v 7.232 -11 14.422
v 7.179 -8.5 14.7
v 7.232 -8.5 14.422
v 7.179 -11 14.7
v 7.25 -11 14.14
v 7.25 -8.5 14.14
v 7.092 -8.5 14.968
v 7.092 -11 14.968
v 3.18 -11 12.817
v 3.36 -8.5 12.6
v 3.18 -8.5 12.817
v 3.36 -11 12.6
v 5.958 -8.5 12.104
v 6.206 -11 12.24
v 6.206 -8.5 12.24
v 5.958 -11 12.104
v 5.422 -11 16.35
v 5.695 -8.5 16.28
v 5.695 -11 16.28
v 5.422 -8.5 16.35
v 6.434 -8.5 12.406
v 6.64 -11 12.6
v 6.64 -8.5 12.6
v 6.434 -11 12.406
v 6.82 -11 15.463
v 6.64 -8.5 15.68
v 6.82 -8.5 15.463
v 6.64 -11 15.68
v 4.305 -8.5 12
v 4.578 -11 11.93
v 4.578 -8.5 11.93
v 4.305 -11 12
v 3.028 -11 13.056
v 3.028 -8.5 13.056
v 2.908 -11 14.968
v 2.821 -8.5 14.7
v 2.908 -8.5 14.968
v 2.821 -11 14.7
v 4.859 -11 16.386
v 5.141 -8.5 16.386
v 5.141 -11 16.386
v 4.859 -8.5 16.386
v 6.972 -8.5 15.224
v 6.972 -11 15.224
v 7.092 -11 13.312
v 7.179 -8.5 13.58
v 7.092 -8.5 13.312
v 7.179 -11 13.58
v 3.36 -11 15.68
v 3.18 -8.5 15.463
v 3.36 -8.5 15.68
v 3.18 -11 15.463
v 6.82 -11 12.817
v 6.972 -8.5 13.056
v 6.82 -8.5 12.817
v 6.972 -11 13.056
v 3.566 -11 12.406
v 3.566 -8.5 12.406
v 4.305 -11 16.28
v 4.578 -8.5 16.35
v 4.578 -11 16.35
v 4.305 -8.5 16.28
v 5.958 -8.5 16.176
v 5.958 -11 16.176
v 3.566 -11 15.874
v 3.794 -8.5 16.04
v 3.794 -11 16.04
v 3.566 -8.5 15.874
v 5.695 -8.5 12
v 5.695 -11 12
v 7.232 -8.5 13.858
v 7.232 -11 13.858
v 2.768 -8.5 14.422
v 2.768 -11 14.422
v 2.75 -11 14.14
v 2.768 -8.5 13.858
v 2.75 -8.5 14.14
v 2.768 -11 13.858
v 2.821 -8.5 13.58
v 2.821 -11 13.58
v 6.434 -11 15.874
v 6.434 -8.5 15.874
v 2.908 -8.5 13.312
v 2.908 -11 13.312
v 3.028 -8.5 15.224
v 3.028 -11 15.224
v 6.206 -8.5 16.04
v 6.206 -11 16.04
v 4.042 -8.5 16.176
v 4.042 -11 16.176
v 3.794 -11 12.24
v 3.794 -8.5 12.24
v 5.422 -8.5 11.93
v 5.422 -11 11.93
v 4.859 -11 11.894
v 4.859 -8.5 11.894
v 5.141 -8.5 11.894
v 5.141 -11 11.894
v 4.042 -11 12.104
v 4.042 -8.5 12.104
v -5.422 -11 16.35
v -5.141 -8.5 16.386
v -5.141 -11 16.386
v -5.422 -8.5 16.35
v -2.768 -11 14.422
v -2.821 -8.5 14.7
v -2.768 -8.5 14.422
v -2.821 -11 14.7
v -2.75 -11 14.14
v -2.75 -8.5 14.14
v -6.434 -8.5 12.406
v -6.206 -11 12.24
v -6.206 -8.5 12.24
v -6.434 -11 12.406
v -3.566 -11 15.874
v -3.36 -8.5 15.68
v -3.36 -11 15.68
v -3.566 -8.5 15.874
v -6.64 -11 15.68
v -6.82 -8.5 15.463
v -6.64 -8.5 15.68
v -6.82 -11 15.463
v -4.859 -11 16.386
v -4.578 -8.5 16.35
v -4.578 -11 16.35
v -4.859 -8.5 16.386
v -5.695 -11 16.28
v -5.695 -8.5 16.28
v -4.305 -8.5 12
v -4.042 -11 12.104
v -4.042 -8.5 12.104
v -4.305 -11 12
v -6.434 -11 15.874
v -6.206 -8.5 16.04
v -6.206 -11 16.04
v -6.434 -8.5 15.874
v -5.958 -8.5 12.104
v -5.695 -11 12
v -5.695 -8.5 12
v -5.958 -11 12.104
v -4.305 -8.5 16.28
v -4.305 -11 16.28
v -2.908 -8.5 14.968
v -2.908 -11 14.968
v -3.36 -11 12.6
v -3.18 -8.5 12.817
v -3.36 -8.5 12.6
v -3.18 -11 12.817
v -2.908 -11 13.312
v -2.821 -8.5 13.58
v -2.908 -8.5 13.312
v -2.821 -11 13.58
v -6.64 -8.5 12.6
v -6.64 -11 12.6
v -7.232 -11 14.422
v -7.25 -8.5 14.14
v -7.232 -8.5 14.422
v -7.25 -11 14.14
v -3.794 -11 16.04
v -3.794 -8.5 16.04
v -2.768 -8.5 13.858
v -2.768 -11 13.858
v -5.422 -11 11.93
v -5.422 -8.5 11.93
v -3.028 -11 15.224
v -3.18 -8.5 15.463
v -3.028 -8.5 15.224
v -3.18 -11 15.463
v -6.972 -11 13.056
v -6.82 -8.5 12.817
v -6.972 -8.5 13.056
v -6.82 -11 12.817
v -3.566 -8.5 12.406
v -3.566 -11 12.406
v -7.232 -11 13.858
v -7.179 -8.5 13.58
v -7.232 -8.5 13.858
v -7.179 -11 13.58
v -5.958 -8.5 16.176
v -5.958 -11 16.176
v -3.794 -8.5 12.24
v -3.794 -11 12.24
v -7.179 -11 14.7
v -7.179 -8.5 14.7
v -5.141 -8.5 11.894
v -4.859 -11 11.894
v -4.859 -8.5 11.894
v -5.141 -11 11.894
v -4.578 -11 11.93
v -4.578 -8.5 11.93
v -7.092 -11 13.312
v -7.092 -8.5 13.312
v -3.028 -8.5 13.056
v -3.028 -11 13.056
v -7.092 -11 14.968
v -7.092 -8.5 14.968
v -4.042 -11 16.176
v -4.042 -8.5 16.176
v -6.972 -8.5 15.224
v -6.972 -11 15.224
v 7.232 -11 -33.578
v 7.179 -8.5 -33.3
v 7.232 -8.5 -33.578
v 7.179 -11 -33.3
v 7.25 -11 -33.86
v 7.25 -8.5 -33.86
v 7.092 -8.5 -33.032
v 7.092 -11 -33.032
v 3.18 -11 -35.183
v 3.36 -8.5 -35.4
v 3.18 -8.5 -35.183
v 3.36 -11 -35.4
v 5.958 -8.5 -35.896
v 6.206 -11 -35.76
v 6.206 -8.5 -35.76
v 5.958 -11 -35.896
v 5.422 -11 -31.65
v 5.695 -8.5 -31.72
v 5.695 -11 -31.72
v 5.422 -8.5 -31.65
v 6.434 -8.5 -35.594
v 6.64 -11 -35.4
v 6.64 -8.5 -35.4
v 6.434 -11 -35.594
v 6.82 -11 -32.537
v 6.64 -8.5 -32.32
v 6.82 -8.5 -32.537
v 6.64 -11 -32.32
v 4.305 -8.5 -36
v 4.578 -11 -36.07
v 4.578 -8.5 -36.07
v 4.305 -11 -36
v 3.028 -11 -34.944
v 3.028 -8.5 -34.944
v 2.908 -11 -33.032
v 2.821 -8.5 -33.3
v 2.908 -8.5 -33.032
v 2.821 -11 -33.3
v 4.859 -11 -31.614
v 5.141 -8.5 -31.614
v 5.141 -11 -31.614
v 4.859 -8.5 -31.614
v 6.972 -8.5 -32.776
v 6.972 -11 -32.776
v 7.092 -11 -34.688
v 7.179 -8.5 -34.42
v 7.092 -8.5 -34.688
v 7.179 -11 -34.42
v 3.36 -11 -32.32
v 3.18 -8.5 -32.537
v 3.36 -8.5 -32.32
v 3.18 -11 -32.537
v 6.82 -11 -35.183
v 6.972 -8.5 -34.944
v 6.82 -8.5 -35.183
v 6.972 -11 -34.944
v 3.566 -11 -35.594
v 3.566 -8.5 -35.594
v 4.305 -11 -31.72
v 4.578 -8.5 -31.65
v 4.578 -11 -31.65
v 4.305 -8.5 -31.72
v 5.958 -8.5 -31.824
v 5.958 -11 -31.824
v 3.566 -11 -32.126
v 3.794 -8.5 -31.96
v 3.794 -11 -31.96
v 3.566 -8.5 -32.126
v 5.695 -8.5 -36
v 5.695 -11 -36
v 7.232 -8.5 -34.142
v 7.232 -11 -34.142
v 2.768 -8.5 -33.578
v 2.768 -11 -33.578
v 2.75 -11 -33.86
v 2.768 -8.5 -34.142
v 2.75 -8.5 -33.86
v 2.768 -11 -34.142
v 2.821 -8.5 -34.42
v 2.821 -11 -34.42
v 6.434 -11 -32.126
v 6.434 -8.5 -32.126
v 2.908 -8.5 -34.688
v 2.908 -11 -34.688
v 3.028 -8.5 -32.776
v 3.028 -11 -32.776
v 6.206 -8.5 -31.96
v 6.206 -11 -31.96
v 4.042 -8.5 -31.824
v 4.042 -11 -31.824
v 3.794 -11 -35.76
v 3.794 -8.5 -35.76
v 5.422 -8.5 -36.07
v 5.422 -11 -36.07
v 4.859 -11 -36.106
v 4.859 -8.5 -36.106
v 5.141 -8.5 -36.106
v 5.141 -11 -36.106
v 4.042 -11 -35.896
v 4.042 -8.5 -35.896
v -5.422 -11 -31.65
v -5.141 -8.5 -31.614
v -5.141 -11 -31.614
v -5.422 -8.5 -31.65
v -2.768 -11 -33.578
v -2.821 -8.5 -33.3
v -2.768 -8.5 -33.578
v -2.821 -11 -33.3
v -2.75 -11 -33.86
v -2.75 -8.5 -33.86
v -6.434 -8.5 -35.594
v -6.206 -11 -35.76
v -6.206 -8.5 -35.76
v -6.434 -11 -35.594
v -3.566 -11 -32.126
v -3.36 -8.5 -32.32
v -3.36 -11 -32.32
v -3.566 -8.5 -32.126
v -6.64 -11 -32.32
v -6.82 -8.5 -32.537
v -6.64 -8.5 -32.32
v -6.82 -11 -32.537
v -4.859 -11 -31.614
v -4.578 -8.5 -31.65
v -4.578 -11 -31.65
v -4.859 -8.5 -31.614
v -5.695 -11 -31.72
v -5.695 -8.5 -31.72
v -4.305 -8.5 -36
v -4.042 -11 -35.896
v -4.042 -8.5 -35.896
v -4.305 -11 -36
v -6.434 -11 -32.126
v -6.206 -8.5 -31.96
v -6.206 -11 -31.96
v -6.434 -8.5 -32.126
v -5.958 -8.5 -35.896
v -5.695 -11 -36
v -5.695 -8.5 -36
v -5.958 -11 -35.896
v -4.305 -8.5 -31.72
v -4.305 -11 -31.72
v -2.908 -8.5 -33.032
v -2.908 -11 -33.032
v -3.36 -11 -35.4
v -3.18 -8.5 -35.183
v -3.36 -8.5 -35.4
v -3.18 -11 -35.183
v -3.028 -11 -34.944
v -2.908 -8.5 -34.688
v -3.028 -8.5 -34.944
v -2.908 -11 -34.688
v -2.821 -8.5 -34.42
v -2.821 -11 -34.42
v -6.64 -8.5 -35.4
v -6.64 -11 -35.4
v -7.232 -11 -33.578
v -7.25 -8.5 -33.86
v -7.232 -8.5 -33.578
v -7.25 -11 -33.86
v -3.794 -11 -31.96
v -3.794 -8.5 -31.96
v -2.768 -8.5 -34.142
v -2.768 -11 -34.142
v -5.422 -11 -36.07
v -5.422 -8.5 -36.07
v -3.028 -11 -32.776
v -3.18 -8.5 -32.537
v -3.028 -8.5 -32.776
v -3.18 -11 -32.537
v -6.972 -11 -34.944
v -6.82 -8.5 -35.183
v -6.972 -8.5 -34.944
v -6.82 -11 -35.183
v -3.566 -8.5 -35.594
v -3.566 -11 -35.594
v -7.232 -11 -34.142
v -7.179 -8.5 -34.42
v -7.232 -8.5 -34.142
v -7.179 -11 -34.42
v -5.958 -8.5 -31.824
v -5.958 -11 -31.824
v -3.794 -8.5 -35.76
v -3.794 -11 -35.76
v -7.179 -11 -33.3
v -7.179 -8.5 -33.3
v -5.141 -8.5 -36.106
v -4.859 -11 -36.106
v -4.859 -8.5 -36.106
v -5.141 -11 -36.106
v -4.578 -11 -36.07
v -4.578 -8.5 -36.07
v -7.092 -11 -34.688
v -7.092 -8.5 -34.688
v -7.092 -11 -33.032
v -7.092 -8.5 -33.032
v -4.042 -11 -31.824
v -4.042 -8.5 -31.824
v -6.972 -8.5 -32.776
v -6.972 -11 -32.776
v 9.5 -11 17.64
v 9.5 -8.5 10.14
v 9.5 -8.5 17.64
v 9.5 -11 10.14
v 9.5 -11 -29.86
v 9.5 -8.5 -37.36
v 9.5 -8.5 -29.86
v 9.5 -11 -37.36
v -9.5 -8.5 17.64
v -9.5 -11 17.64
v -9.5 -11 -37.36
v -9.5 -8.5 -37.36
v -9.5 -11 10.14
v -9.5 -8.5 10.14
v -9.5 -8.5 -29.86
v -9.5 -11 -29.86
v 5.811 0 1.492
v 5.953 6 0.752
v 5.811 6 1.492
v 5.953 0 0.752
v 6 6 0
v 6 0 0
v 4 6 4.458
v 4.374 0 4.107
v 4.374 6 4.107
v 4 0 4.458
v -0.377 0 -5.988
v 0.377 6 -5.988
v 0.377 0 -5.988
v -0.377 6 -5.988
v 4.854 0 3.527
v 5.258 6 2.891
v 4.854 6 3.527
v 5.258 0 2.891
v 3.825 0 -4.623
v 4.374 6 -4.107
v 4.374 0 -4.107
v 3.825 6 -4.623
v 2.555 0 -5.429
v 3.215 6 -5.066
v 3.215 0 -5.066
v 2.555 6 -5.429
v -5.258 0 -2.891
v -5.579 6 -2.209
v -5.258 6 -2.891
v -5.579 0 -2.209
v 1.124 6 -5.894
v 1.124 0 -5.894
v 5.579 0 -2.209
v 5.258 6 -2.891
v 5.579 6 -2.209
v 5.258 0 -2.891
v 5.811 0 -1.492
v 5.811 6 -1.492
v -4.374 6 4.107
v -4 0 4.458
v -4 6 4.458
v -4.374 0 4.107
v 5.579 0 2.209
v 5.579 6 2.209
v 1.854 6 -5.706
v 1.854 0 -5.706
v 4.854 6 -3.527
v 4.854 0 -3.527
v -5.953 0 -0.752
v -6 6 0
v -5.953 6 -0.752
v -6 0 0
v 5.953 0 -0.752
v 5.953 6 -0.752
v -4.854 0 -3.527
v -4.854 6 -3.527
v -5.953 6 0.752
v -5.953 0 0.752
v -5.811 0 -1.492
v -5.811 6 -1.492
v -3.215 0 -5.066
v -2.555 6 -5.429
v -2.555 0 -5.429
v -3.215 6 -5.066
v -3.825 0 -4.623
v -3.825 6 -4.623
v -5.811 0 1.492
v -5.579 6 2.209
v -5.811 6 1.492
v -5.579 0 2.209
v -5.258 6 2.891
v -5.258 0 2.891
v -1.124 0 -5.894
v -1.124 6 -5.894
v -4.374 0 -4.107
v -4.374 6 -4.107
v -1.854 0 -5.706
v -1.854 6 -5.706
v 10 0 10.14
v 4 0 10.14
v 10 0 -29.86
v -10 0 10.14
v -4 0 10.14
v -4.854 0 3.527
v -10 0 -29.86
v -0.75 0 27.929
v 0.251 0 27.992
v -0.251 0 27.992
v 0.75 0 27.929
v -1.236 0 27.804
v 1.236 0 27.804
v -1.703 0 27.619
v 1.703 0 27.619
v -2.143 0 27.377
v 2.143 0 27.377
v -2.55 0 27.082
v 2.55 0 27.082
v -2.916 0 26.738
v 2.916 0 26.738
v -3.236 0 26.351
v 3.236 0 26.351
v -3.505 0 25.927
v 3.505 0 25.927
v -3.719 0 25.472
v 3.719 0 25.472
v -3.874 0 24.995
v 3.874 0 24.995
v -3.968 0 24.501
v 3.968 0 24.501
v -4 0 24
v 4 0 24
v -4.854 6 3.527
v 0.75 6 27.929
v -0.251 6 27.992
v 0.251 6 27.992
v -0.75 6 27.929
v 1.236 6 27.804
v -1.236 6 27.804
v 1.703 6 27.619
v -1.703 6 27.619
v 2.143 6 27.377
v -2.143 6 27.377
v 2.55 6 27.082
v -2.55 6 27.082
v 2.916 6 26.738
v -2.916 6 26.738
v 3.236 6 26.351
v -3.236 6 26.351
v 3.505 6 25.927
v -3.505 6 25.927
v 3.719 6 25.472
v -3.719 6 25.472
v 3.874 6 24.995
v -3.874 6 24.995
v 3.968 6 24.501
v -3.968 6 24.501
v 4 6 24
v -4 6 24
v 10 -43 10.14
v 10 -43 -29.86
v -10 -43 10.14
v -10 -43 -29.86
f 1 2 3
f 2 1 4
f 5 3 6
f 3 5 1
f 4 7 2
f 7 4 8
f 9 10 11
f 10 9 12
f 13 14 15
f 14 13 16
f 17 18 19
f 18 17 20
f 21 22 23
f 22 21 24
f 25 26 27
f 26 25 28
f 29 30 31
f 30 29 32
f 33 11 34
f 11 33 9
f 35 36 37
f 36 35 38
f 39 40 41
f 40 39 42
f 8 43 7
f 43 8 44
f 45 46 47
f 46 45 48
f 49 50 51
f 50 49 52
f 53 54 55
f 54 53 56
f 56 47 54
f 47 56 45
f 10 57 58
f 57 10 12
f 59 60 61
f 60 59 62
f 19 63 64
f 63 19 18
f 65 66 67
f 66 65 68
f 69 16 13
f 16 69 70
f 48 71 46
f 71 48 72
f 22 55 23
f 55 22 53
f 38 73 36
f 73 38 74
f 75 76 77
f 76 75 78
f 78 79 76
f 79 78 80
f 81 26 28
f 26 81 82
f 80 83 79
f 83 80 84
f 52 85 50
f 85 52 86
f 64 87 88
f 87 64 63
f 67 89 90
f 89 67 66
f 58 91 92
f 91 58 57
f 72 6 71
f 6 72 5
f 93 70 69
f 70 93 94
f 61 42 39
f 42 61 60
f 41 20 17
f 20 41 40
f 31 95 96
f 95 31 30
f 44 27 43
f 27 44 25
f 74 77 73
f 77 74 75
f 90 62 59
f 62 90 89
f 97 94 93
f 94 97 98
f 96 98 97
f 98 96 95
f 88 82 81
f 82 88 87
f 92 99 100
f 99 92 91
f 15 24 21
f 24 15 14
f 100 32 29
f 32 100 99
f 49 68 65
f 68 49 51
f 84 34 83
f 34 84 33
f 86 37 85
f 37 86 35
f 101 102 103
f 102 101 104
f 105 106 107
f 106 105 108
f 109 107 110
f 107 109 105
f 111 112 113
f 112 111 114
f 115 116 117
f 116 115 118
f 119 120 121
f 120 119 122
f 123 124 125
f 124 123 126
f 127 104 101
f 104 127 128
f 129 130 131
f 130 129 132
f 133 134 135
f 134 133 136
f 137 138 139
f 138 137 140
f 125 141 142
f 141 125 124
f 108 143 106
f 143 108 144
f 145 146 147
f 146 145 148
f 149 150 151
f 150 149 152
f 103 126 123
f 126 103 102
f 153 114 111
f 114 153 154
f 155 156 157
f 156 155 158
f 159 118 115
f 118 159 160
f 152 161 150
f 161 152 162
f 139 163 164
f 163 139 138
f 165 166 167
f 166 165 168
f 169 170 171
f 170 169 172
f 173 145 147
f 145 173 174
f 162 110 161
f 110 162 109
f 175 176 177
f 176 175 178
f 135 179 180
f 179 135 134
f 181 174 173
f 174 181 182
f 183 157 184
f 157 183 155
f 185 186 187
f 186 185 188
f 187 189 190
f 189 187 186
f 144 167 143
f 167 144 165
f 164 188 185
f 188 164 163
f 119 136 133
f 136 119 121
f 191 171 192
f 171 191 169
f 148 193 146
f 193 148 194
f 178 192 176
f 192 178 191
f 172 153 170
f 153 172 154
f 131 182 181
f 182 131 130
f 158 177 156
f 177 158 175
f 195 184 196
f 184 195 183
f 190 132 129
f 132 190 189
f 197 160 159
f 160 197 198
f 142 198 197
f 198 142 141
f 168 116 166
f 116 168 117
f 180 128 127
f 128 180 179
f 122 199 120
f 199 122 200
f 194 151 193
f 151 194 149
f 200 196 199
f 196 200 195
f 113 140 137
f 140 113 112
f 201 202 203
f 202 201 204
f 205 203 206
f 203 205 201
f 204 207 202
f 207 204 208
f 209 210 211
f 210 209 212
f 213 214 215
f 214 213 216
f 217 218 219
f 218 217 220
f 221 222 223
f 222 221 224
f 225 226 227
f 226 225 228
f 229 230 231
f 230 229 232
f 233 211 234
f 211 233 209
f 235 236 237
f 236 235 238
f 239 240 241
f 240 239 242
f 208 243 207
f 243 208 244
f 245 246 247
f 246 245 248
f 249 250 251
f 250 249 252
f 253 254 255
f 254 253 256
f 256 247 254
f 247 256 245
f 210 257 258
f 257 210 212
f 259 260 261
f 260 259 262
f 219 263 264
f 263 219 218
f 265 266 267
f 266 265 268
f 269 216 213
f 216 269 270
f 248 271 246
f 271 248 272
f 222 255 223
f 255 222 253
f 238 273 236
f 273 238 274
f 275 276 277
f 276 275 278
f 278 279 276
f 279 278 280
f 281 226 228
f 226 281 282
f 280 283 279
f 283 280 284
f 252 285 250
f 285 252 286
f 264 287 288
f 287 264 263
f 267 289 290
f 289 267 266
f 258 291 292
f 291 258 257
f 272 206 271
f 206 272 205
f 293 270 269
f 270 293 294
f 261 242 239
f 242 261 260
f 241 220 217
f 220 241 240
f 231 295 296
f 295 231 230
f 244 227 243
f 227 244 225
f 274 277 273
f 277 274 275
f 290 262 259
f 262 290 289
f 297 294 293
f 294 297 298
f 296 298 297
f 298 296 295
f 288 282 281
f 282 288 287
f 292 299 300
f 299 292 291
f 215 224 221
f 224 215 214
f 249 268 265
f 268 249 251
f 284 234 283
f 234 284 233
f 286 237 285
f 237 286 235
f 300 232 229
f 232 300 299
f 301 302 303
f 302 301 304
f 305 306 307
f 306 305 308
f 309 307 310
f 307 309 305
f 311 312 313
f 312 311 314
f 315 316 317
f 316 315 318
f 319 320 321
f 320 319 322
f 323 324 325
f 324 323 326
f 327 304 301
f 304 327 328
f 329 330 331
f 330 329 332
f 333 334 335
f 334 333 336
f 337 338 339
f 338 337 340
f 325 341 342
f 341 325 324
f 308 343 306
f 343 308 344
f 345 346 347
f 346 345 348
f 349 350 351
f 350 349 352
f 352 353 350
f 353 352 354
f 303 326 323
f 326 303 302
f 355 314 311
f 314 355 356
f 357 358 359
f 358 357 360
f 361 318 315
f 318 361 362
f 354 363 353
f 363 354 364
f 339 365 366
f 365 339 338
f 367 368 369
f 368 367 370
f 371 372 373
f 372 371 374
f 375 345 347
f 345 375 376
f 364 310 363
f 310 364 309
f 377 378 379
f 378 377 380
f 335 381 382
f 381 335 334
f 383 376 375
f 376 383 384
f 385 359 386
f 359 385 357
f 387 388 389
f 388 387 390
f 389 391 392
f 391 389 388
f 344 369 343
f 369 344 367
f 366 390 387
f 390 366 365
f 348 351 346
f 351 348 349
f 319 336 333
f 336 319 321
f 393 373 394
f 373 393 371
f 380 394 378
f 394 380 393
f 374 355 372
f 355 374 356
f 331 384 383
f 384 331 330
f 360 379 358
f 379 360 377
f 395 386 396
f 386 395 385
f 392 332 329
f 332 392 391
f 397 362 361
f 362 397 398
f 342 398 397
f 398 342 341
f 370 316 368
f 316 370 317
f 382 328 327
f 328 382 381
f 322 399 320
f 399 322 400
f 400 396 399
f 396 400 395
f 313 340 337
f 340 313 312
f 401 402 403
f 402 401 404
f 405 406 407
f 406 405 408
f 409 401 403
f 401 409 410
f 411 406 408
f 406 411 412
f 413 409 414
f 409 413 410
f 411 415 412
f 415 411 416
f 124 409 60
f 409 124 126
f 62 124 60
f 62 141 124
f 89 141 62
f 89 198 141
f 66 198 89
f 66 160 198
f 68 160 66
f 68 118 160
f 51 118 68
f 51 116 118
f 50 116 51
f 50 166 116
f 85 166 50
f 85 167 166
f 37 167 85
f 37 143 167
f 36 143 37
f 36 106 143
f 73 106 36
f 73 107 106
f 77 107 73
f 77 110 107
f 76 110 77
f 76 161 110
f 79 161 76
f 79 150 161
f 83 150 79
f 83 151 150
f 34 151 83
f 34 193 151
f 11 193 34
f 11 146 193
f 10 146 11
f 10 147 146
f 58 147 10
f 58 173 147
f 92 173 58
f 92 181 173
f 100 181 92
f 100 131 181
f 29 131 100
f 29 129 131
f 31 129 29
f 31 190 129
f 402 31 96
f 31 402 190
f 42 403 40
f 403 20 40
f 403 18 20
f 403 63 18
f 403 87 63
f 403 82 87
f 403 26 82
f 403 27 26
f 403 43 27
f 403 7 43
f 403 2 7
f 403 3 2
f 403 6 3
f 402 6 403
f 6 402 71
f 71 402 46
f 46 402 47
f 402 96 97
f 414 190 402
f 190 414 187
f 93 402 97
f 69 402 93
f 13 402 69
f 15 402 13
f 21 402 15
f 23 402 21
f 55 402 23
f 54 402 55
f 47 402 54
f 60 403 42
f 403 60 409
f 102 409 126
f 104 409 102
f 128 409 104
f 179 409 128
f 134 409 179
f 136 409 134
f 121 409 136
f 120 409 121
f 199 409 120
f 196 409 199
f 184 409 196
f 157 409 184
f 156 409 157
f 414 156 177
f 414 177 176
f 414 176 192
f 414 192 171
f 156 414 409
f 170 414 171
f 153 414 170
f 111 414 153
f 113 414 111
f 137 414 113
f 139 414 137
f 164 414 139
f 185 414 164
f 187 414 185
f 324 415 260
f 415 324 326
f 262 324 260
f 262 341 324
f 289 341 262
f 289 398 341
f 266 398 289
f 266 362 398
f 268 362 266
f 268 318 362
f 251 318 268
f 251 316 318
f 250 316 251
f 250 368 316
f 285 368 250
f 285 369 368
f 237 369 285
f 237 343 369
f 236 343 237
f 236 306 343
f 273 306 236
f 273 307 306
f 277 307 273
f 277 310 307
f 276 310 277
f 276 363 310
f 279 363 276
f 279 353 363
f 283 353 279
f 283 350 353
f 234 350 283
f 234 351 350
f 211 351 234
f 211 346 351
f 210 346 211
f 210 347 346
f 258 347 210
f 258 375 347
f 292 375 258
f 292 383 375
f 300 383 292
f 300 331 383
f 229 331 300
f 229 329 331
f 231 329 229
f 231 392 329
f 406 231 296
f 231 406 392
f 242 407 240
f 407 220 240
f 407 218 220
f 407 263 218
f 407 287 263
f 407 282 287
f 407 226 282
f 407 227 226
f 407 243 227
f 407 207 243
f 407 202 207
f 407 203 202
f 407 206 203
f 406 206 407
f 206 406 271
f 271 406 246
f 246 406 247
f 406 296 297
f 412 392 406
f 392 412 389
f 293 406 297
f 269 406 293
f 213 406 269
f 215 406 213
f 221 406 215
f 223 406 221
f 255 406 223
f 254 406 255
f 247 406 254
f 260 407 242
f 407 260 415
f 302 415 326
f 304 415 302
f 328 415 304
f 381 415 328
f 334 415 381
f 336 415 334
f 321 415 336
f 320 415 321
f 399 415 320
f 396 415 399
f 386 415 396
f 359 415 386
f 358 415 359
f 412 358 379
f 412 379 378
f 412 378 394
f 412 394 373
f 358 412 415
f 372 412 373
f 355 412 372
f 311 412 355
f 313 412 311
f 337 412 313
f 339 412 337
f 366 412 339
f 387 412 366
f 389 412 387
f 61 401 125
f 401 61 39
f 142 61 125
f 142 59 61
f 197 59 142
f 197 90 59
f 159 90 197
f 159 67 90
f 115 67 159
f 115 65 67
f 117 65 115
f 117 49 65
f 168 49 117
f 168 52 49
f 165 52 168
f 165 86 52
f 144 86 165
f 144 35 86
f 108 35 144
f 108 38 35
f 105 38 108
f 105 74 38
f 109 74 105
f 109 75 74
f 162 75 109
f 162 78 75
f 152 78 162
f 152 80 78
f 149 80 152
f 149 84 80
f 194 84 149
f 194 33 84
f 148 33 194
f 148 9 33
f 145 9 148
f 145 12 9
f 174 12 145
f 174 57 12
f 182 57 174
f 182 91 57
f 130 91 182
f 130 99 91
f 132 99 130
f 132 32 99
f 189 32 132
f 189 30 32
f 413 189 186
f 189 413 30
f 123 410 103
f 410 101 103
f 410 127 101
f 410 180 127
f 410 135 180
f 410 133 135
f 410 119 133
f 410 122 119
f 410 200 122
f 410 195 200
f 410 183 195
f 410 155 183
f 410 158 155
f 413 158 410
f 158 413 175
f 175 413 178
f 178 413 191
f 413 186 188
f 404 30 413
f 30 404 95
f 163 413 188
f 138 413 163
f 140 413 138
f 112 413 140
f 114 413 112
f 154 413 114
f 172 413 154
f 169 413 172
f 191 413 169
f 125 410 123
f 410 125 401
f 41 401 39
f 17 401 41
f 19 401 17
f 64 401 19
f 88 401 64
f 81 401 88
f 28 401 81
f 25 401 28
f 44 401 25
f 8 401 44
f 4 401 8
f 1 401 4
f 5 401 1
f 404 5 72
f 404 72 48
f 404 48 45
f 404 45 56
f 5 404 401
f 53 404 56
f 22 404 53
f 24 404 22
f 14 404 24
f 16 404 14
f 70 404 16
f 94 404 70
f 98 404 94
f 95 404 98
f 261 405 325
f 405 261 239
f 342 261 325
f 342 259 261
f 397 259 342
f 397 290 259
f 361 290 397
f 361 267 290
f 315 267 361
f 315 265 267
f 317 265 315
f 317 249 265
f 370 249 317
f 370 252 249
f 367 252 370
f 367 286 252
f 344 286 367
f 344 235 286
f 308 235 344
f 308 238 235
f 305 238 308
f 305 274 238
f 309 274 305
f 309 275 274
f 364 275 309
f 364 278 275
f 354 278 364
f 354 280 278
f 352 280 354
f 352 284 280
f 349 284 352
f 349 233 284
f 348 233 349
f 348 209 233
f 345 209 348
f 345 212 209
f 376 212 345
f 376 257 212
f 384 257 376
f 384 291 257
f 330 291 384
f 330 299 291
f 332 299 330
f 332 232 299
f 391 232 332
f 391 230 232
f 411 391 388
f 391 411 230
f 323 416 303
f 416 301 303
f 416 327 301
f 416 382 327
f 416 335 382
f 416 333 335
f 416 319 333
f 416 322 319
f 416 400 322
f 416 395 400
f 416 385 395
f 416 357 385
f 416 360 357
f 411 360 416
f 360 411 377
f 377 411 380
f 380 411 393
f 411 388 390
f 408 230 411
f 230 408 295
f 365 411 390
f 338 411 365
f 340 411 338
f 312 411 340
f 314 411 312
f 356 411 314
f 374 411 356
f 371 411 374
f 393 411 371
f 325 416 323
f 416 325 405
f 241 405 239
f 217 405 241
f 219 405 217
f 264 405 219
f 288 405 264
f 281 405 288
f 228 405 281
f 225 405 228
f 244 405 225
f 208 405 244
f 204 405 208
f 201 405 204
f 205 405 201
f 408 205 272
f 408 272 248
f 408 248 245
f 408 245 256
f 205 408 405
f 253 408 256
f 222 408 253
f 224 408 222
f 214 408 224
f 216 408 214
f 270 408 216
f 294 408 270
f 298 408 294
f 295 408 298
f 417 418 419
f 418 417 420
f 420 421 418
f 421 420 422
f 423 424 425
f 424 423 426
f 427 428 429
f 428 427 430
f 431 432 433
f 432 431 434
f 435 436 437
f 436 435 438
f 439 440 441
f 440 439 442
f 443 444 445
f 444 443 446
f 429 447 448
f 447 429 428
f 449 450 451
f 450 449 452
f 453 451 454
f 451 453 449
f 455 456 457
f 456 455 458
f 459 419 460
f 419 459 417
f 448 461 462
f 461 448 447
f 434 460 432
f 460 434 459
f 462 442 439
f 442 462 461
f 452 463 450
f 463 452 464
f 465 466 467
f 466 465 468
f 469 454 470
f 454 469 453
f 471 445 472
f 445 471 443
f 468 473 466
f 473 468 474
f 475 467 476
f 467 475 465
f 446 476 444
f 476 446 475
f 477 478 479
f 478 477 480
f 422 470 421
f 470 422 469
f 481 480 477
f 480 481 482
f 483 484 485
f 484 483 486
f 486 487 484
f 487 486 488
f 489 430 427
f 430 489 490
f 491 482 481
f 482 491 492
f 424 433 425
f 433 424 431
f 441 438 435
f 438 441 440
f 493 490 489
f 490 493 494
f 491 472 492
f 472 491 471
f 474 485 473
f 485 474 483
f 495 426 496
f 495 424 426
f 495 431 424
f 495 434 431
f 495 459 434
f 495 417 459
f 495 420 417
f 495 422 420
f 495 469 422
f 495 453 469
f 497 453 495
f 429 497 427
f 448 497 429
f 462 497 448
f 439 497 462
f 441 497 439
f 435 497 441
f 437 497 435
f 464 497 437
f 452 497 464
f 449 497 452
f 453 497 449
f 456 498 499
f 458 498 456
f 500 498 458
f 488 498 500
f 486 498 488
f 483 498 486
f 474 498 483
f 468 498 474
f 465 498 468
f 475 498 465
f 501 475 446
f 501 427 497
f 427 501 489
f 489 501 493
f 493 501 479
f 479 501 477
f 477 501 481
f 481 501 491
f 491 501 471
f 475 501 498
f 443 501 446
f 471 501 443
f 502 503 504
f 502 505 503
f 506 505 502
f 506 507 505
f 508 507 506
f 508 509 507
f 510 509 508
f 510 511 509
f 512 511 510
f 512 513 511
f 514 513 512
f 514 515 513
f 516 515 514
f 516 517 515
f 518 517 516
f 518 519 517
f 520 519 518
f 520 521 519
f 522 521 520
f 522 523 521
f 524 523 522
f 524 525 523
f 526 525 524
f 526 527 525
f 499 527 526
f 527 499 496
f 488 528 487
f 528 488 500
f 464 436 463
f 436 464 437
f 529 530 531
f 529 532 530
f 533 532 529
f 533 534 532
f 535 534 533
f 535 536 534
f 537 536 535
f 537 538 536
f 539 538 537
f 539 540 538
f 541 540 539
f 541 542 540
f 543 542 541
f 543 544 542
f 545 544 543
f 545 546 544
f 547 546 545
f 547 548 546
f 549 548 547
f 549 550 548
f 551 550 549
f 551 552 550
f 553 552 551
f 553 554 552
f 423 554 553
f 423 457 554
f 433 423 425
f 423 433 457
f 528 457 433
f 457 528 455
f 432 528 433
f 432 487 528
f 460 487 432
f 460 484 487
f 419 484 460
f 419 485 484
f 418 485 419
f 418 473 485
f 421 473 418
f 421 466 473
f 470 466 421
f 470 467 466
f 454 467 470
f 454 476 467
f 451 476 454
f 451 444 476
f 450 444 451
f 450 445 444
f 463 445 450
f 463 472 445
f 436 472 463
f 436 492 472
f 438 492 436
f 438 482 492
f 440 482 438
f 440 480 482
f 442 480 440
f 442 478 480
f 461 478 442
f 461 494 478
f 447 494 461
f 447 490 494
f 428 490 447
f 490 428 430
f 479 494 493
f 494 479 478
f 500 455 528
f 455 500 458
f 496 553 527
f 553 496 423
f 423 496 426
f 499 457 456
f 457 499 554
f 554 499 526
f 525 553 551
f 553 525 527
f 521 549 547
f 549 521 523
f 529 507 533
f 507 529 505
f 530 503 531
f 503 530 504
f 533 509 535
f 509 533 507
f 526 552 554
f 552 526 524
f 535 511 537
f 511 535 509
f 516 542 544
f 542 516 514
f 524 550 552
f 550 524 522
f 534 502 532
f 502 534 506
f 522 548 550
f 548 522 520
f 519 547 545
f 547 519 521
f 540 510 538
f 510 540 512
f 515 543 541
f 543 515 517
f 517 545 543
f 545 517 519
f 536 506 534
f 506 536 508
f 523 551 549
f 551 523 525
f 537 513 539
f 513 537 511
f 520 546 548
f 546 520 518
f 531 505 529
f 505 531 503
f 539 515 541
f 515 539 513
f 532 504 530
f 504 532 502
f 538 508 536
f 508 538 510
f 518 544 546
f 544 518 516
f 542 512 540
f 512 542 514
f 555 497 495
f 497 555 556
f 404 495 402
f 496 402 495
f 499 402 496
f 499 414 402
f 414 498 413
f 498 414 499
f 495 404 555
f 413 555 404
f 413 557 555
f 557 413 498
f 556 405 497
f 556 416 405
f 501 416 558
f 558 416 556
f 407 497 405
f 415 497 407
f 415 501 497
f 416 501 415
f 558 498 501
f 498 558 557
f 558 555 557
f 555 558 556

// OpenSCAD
// copyright: GNU @kuberlog
// https://www.amazon.com/gp/product/B08739MGPL

$fn = 50;

body_x = 20;
body_y = 43;
body_z = 40;
body_delta_y = -body_y/2;
body_delta_z = -9.86; // this dimension, we do not know yet, measure

tab_x = 19;
tab_y = 2.5; // this dimension, we also do not know yet, measure
tab_z = 55;
tab_delta_y = -(body_y - 32 - (tab_y/2));
tab_delta_z = body_delta_z;

hole_d = 4.5;
hole_h = tab_y + 2; //through-hole
hole_delta_y = tab_delta_y + 1;
hole_delta_x = 5;
hole_delta_z = 48/2;
holes_delta_z = body_delta_z;
holes_deta_y = -tab_y/2;

horn_y = 6;
horn_delta_y = horn_y/2;
horn_base_d = 12;
horn_extension_z = 24;
horn_tip_d = 8;
horn_extension_x = horn_tip_d;
horn_extension_delta_z = horn_extension_z/2;
horn_tip_delta_z = horn_extension_z;


module body() {
  color([0.1,0.1,0.1]) translate([0, body_delta_y, body_delta_z]) cube([body_x, body_y, body_z], center=true);
}

module tab() {
  difference() {
    color([0.1, 0.1, 0.1]) translate([0, tab_delta_y, tab_delta_z]) cube([tab_x, tab_y, tab_z], center=true);
    holes();
  }
}

module hole() {
  rotate([90,0,0]) cylinder(d=hole_d, h=hole_h, center=true);
}

module holes() {
  color([7/255, 133/255, 230/255]) {
    translate([0,holes_deta_y,body_delta_z]) {
      translate([hole_delta_x, hole_delta_y, hole_delta_z]) hole();
      translate([-hole_delta_x, hole_delta_y, hole_delta_z]) hole();
      translate([hole_delta_x, hole_delta_y, -hole_delta_z]) hole();
      translate([-hole_delta_x, hole_delta_y, -hole_delta_z]) hole();
    }
  }
}

module horn() {
  color([7/255, 133/255, 230/255]) {
    translate([0,horn_delta_y,0]) {
      rotate([90, 0, 0]) cylinder(d=horn_base_d, h=horn_y, center=true);
      translate([0,0,horn_extension_delta_z]) cube([horn_extension_x, horn_y, horn_extension_z], center=true);
      translate([0,0,horn_tip_delta_z]) rotate([90,0,0]) cylinder(d=horn_tip_d, h = horn_y, center=true);
      
    }
  }
}

module Servo35kg(x) {
  body();
  tab();
  rotate([0,x,0]) horn();
}

Servo35kg(/*$t*180*//*animation*/    0/*not animation*/);
